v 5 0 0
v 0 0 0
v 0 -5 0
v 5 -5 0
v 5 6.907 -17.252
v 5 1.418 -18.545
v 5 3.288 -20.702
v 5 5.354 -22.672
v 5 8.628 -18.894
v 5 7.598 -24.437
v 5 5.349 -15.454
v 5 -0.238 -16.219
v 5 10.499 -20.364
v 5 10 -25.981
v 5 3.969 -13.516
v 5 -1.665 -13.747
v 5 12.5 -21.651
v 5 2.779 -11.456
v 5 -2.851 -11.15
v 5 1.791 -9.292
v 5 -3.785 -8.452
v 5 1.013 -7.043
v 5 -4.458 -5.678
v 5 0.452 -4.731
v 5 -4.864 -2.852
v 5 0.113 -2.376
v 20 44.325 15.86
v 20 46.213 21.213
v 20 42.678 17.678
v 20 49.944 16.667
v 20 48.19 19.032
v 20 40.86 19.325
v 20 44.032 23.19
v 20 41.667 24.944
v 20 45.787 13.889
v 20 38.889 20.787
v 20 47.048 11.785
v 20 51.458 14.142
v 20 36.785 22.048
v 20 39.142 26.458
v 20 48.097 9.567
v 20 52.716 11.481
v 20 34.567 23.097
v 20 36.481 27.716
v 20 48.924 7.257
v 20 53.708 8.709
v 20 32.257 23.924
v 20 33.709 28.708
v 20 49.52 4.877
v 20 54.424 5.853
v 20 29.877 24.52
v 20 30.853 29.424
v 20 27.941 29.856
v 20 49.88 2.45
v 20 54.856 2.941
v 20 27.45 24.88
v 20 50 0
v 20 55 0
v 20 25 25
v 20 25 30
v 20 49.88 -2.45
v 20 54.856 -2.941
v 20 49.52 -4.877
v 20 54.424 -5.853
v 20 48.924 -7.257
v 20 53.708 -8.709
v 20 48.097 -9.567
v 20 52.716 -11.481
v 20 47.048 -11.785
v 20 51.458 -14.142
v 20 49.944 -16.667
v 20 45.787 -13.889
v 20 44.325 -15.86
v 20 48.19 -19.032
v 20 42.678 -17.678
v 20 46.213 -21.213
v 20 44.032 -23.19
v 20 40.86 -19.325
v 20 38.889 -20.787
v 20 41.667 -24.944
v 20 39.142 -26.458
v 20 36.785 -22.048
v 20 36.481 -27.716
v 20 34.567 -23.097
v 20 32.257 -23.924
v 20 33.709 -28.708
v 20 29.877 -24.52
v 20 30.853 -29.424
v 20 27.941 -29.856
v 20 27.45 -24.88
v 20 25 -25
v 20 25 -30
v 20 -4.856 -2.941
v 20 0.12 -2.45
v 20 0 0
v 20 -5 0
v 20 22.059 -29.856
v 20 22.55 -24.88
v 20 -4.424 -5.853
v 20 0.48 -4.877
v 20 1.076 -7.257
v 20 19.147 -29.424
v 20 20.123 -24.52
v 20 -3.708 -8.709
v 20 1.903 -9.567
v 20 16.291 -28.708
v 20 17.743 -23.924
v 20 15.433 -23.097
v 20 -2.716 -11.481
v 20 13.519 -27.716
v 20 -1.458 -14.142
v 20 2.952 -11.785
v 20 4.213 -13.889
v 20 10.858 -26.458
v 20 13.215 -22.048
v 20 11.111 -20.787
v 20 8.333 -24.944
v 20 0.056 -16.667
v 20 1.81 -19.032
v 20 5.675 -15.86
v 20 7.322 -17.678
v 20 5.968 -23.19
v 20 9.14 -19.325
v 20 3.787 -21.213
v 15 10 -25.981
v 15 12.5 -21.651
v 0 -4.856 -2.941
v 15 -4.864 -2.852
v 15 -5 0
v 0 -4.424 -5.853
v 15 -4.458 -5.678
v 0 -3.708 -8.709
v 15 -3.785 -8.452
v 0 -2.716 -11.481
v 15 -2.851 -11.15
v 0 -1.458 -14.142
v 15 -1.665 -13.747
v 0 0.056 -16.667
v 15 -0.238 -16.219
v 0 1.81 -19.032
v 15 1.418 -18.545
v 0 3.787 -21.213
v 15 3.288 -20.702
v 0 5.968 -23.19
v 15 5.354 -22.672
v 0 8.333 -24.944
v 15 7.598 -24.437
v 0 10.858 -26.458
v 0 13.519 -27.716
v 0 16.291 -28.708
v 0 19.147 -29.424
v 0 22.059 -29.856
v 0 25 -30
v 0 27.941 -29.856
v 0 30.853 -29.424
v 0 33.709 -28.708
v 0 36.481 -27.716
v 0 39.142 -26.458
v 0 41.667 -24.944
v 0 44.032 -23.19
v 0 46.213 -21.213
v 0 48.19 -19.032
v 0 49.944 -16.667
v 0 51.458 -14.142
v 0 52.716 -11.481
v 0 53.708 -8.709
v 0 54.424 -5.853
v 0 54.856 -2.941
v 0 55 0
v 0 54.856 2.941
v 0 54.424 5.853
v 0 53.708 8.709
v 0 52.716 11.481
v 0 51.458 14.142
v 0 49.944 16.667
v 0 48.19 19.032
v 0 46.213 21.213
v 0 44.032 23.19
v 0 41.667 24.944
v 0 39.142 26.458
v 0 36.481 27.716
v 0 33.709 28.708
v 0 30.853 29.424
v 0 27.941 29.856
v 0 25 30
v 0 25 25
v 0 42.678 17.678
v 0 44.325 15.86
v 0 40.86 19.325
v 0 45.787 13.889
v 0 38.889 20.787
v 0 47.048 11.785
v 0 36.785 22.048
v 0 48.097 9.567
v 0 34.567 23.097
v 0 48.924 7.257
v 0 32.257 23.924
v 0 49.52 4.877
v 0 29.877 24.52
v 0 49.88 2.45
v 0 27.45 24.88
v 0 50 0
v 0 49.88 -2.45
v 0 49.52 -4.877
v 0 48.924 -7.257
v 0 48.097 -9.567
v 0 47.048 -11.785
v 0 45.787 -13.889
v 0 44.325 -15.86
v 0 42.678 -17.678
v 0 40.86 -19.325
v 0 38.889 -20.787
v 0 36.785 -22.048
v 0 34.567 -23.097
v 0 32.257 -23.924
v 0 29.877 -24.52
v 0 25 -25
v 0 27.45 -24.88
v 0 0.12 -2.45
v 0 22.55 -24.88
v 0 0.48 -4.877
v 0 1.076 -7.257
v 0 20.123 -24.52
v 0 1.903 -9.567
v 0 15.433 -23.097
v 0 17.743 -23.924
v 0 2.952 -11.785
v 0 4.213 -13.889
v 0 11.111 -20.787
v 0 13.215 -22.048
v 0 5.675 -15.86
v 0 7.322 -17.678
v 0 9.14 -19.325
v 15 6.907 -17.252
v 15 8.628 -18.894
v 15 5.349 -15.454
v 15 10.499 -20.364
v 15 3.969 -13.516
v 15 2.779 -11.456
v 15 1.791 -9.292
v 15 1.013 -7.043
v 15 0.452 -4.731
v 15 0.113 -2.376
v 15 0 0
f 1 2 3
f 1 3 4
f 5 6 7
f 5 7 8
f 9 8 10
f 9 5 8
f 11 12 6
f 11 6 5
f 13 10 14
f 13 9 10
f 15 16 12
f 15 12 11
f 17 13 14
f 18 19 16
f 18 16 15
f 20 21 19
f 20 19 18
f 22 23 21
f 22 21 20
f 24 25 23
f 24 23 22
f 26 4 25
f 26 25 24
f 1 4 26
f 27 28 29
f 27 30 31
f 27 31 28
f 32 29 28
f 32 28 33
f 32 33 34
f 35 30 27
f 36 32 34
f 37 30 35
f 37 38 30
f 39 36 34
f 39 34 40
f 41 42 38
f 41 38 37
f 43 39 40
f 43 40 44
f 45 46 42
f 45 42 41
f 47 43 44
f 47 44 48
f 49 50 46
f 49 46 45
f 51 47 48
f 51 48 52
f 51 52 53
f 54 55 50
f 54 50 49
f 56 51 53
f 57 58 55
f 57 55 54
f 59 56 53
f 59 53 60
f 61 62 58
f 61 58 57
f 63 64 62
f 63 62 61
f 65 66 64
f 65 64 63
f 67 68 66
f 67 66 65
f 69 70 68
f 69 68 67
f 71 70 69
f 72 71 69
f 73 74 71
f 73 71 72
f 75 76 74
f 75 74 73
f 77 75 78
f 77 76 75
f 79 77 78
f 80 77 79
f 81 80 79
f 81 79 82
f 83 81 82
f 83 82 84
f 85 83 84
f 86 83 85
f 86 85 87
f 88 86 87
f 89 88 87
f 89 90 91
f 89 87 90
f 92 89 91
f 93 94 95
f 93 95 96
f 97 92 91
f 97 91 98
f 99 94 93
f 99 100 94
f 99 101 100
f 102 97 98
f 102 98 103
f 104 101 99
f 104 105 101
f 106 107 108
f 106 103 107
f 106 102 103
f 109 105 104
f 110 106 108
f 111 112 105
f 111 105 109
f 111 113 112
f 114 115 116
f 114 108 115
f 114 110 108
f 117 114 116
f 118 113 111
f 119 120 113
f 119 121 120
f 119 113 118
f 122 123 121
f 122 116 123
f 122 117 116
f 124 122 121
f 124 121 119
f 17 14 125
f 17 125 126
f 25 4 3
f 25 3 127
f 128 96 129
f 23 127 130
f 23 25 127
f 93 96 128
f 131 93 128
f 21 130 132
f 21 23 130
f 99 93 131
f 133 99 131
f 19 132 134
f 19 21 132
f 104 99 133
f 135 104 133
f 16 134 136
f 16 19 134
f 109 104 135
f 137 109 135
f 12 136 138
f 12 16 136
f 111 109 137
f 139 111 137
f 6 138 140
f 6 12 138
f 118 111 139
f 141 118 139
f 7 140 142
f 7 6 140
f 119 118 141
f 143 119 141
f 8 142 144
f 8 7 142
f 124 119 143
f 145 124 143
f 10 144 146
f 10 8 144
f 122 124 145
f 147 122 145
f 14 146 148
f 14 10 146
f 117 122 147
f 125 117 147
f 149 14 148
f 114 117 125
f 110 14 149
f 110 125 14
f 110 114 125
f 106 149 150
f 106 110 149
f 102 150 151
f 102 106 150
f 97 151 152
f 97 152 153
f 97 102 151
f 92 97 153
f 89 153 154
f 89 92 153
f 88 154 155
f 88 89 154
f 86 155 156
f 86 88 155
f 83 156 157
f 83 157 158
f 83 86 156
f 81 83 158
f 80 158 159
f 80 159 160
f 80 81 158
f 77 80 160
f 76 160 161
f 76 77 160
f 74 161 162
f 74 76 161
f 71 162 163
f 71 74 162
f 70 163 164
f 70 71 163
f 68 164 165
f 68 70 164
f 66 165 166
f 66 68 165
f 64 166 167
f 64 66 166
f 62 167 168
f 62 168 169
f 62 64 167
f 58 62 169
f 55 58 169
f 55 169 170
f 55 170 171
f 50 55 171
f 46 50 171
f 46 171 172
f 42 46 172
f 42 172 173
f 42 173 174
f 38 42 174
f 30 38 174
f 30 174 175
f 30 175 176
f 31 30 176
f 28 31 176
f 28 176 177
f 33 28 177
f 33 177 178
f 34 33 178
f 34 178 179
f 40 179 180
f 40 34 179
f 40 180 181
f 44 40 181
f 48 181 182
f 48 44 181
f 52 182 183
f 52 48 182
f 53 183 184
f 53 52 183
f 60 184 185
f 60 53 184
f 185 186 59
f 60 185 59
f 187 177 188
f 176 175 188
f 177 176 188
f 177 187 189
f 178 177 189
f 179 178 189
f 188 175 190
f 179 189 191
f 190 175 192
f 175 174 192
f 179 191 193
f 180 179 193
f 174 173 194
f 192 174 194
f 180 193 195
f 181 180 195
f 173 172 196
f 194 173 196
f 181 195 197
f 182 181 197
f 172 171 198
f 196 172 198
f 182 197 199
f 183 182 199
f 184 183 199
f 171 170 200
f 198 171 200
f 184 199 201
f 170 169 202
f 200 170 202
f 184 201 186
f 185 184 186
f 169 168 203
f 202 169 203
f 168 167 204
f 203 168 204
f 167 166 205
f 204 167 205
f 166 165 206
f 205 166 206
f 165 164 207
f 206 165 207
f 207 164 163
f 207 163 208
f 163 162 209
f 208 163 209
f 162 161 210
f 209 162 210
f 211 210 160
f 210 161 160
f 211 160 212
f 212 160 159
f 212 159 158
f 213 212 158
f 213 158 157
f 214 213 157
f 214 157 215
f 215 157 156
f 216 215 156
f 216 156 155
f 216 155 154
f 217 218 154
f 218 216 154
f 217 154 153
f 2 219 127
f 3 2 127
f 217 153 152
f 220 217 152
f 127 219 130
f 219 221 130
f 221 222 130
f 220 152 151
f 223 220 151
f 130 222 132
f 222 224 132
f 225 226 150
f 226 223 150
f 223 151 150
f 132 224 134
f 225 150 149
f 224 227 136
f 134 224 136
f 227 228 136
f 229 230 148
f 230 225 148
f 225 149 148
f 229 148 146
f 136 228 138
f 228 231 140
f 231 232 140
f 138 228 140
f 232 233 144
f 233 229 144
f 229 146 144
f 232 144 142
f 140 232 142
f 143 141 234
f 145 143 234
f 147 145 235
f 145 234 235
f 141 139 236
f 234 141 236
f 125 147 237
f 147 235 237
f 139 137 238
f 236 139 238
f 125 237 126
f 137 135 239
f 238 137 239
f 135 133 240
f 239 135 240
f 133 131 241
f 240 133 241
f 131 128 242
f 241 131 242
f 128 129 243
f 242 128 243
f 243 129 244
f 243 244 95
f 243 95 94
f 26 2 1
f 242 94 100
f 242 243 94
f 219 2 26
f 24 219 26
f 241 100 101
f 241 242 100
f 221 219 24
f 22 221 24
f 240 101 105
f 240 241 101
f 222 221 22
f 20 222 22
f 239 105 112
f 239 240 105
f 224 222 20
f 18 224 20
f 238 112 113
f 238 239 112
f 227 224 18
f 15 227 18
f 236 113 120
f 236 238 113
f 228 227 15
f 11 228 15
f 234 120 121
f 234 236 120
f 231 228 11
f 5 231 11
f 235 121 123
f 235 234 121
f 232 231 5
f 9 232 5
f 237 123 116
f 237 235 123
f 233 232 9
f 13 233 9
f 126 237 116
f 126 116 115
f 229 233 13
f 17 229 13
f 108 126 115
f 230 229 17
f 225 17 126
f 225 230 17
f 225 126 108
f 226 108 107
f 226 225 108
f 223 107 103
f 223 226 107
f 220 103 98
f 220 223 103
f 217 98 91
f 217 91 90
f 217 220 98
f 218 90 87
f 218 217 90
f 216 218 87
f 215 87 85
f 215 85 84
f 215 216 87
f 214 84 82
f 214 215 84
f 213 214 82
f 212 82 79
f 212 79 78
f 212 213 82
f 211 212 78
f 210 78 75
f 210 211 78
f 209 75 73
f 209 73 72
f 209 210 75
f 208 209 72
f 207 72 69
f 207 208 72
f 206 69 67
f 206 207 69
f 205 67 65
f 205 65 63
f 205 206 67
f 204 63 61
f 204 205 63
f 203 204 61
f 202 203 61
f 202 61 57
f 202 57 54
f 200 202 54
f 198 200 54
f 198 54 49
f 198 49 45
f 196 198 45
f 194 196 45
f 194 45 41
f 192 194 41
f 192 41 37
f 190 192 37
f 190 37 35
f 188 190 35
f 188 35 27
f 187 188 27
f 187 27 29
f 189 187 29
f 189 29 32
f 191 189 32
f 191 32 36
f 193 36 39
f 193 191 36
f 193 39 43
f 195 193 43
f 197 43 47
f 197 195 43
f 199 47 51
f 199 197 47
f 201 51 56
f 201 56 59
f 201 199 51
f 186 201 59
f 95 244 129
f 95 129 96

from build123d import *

# Parameters (mm, degrees)
SKETCH1_W          = 5
SKETCH1_H          = 5
SKETCH1_W_2        = 10
REVOLVE1_ANGLE     = 270
CUT_REVOLVE1_START = 5
CUT_REVOLVE1_DEPTH = 10


# Read off the part's stored shape, not the designer's step: Cut-Revolve1
with BuildPart() as part:
    # Sketch1 → Revolve1 (revolve)
    with BuildSketch(Plane.XY):
        with Locations((2.5, -2.5)):
            Rectangle(SKETCH1_W, SKETCH1_H)
        with Locations((17.5, -2.5)):
            Rectangle(SKETCH1_W, SKETCH1_H)
        with Locations((10, -2.5)):
            Rectangle(SKETCH1_W_2, SKETCH1_H)
    revolve(axis=Axis((-365.597578267, 25, 0), (1, 0, 0)), revolution_arc=REVOLVE1_ANGLE)

    # Cut-Revolve1 outline → Cut-Revolve1 (cut)
    with BuildSketch(Plane.YZ.offset(CUT_REVOLVE1_START)):
        with BuildLine():
            Line((10, -25.980762114), (12.5, -21.650635095))
            ThreePointArc((12.5, -21.650635095), (3.349364905, -12.5), (0, 0))
            Line((0, 0), (-5, 0))
            ThreePointArc((-5, 0), (-0.980762114, -15), (10, -25.980762114))
        make_face()
    extrude(amount=CUT_REVOLVE1_DEPTH, mode=Mode.SUBTRACT)


solid = part.part
